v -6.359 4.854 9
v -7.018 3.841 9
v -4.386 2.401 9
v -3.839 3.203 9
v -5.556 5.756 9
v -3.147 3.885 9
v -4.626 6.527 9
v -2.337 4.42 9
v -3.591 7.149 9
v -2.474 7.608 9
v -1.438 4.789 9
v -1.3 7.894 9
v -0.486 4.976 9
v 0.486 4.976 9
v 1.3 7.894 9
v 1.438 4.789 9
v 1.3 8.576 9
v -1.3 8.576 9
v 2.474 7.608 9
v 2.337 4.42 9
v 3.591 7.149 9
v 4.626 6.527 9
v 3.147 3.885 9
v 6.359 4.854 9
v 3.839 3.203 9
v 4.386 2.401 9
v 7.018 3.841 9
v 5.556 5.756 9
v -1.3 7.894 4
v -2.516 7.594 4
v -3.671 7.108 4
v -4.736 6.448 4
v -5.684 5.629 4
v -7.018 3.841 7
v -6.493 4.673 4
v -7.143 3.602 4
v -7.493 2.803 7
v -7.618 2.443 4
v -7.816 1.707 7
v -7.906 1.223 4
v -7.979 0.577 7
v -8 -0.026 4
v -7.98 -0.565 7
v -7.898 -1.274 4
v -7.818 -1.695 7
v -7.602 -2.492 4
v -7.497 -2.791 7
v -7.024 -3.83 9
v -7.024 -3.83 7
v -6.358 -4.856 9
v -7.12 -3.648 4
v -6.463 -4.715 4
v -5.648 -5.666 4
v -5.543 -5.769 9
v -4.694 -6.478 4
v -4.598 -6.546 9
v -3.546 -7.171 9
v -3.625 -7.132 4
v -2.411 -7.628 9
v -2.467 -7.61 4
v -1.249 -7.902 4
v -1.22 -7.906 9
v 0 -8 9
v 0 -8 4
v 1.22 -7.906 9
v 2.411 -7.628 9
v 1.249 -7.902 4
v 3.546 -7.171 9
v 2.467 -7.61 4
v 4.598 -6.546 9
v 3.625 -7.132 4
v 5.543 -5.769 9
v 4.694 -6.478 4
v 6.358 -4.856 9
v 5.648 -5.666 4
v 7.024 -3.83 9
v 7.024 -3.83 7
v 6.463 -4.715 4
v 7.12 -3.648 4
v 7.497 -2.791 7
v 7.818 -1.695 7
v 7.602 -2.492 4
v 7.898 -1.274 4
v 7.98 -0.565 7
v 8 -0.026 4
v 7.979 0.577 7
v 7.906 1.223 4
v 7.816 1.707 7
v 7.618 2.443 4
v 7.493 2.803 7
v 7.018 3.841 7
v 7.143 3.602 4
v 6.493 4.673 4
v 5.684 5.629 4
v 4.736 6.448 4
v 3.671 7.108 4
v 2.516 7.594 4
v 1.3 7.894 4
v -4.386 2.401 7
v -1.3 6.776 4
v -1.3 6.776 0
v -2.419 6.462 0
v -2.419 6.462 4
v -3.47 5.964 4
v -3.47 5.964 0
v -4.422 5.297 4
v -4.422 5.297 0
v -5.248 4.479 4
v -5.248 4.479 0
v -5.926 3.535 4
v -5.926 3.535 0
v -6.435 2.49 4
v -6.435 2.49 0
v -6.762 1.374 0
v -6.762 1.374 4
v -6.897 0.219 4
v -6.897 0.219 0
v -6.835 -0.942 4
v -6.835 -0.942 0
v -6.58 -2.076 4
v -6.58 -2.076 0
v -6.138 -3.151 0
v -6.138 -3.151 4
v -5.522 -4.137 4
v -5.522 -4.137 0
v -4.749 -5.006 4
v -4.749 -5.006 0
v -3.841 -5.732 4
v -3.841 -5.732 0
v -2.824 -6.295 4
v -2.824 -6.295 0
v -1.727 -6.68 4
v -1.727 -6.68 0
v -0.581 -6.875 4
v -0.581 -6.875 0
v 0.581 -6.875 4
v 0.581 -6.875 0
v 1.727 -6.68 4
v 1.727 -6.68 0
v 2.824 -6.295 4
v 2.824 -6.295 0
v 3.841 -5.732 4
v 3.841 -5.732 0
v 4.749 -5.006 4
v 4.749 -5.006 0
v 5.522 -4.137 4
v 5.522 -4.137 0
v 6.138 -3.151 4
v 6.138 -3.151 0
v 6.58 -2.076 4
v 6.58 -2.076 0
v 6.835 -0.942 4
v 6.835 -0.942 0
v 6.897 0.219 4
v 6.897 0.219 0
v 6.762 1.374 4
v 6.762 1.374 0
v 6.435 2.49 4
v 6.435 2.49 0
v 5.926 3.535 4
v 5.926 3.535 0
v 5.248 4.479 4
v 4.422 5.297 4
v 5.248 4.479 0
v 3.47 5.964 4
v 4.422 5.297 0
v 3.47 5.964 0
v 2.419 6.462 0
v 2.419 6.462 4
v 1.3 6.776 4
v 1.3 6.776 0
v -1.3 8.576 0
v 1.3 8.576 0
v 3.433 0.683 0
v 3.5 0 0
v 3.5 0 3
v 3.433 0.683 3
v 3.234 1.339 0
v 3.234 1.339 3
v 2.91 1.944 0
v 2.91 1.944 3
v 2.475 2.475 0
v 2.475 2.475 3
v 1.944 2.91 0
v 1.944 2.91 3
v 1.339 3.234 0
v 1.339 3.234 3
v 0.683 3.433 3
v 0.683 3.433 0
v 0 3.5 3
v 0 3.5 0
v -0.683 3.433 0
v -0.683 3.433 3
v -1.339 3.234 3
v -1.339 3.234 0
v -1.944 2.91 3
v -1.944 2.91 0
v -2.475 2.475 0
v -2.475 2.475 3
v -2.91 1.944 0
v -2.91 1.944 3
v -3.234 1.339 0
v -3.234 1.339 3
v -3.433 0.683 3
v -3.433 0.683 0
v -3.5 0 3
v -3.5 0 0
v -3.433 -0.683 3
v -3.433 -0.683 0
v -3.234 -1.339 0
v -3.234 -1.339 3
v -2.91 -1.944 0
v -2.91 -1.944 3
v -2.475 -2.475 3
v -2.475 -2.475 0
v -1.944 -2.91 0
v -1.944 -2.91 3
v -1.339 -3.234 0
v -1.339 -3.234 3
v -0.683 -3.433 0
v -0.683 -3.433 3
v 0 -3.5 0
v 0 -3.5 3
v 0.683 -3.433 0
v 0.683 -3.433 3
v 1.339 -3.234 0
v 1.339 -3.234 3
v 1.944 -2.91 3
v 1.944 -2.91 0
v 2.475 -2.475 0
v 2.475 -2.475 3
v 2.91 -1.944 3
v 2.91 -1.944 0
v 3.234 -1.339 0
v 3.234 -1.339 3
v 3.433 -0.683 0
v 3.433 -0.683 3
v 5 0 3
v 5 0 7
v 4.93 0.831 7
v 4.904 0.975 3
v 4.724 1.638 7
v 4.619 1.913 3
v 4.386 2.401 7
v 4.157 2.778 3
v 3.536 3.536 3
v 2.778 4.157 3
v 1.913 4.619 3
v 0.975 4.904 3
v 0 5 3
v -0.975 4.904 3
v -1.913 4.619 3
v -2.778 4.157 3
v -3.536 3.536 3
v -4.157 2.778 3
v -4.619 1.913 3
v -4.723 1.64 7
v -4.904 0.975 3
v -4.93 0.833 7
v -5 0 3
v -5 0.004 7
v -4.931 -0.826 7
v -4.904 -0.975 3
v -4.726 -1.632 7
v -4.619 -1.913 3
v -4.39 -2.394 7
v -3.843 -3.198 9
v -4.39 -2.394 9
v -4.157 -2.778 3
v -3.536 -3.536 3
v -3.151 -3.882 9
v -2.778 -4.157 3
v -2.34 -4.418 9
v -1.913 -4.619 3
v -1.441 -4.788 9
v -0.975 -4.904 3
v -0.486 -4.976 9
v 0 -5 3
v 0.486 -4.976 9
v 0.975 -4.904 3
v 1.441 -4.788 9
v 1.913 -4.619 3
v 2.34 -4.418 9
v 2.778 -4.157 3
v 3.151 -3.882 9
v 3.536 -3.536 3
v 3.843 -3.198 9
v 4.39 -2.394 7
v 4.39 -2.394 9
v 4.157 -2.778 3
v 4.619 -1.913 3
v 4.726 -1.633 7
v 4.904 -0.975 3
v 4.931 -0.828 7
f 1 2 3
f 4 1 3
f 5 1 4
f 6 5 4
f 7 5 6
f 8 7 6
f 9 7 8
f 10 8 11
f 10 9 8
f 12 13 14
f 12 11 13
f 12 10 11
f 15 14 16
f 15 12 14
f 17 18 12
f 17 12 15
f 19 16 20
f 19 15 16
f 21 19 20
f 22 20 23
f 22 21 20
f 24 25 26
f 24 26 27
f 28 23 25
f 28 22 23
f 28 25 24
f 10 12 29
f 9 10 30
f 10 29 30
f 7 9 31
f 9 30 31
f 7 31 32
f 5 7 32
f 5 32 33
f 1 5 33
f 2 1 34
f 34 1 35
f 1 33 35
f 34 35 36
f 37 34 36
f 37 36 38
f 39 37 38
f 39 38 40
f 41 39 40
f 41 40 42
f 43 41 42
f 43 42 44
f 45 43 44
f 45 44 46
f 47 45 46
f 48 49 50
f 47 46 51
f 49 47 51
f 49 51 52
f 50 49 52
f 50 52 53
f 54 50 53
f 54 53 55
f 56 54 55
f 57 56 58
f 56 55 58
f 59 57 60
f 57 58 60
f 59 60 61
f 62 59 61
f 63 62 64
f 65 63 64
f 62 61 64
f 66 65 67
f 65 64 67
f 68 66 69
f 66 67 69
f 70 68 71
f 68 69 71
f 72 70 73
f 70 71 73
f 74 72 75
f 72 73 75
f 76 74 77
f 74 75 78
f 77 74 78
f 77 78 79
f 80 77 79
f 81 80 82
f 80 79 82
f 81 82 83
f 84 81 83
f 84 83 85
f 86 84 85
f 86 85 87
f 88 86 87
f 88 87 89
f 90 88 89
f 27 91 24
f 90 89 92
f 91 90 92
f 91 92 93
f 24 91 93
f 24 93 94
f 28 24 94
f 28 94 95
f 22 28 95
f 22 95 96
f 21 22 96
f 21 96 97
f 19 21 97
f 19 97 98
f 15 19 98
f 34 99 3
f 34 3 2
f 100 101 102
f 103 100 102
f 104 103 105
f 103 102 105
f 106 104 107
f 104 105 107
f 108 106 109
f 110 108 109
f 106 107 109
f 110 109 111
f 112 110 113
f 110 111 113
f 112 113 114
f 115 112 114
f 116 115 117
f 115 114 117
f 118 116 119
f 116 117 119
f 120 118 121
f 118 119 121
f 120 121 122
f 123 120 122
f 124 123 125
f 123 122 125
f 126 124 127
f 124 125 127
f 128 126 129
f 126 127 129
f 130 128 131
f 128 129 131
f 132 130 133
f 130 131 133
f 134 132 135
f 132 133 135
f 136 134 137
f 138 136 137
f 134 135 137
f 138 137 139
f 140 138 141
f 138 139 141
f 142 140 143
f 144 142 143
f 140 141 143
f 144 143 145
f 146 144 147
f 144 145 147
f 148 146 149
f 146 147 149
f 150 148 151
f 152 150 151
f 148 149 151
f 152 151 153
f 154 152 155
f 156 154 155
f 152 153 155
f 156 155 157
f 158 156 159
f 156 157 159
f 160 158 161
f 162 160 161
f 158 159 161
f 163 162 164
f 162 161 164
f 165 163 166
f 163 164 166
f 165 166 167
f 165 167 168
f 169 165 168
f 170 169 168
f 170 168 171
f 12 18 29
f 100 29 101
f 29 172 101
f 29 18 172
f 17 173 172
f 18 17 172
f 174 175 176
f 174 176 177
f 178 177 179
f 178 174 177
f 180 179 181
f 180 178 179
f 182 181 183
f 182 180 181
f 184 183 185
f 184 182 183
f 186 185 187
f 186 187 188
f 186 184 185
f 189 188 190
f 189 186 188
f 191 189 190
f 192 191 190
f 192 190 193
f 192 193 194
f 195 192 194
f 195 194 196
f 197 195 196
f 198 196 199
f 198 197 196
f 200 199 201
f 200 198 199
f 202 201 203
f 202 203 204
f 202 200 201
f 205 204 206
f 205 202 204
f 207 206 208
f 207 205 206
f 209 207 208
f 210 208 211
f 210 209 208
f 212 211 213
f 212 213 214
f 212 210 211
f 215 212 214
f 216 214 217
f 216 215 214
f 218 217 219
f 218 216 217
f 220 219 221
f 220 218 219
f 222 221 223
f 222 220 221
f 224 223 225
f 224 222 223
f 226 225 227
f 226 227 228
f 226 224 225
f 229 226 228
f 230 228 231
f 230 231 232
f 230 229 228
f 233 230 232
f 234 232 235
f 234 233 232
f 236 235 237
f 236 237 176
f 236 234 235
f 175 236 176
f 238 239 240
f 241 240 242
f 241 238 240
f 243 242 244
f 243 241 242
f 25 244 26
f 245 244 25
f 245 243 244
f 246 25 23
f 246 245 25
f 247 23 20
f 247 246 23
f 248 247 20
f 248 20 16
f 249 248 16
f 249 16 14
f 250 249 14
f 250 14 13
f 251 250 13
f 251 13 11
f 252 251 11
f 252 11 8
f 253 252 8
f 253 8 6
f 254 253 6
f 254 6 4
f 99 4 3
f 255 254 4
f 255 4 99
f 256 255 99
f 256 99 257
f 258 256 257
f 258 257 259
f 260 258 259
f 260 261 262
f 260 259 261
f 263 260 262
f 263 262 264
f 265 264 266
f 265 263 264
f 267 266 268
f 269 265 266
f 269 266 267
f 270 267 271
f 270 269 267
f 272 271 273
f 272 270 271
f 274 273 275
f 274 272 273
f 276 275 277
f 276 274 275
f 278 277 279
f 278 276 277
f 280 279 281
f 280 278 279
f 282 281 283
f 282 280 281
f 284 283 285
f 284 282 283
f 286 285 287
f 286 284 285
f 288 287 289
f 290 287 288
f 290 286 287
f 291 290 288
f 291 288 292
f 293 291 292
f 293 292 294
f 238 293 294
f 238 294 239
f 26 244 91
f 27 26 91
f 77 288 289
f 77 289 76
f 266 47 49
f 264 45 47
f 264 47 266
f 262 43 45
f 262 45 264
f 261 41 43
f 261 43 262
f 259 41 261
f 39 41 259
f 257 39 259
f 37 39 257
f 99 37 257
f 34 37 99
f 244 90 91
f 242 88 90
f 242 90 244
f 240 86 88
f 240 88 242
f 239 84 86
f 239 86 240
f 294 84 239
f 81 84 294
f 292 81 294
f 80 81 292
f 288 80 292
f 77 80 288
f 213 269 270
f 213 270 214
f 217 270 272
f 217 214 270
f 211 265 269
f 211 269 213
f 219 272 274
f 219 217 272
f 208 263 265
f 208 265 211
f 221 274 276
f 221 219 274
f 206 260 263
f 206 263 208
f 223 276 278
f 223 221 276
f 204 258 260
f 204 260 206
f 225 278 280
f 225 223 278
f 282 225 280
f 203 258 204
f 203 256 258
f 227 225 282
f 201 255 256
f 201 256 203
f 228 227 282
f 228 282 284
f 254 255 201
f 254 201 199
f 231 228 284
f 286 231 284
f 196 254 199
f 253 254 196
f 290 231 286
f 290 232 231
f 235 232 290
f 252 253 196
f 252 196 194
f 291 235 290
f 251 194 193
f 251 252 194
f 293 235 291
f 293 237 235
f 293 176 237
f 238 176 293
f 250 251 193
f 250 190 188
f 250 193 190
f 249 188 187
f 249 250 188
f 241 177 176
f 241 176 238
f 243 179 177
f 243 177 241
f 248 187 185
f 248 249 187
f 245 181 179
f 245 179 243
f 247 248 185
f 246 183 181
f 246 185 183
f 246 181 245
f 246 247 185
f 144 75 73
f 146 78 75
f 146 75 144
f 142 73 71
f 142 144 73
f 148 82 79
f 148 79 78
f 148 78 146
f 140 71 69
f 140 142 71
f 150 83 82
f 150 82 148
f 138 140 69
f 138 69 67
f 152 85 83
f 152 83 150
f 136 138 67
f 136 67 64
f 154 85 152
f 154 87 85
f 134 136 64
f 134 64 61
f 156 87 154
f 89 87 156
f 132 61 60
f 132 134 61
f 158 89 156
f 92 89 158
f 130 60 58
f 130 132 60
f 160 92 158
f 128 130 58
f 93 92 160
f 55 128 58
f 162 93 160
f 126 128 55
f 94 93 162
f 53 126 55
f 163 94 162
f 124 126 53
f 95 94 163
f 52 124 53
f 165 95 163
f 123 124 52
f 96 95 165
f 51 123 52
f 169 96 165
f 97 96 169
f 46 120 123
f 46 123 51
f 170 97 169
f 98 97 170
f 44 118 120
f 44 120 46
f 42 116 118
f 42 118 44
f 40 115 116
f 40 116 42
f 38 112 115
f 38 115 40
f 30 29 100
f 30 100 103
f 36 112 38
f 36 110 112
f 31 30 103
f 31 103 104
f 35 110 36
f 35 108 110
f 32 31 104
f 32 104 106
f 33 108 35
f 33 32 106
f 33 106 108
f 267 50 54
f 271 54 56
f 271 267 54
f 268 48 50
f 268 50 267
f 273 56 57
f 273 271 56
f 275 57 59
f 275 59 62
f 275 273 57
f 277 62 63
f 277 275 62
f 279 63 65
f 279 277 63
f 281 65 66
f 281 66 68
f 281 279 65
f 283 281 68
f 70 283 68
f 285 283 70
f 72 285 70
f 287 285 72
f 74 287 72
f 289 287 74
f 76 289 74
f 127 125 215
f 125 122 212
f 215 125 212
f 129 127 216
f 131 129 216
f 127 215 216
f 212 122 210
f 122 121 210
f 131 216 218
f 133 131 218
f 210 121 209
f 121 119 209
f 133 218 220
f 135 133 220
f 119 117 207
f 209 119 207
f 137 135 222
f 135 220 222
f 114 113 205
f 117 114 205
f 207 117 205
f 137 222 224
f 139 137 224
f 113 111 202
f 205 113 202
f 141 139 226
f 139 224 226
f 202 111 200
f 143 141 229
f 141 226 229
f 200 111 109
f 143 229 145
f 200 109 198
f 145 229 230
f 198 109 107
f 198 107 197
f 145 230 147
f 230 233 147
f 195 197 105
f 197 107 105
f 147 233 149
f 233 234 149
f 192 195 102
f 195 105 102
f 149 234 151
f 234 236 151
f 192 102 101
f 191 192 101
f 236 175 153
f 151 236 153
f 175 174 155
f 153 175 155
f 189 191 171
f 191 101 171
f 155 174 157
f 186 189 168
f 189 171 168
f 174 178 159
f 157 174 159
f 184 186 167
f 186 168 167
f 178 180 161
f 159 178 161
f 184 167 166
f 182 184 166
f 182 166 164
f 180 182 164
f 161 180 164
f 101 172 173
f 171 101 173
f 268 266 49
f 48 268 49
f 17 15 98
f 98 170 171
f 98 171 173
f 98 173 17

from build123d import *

# Parameters (mm, degrees)
SKETCH1_R                = 8
SKETCH1_R_2              = 3.5
BOSS_EXTRUDE1_DEPTH      = 3
SKETCH2_R                = 8
SKETCH2_R_2              = 5
BOSS_EXTRUDE2_DEPTH      = 6
WRAP3_SECTION_W          = 4
WRAP3_SECTION_H          = 2
WRAP3_ANGLE              = 57.295779513
WRAP3_SECTOR_2_SECTION_W = 4
WRAP3_SECTOR_2_SECTION_H = 2
WRAP3_SECTOR_2_ANGLE     = 57.295779513
CUT_EXTRUDE1_DEPTH       = 4
BOSS_EXTRUDE3_DEPTH      = 9


with BuildPart() as part:
    # Sketch1 → Boss-Extrude1 (new body)
    with BuildSketch(Plane.XY):
        Circle(SKETCH1_R)
        Circle(SKETCH1_R_2, mode=Mode.SUBTRACT)
    extrude(amount=BOSS_EXTRUDE1_DEPTH)

    # Sketch2 → Boss-Extrude2 (add)
    with BuildSketch(Plane.XY.offset(3)):
        Circle(SKETCH2_R)
        Circle(SKETCH2_R_2, mode=Mode.SUBTRACT)
    extrude(amount=BOSS_EXTRUDE2_DEPTH)

    # Wrap3 section (on wrap section) → Wrap3 (revolve, cut)
    with BuildSketch(Plane(origin=(0, 0, 0), x_dir=(-0.8779640629990781, -0.4787265441587198, 0), z_dir=(0.4787265441587198, -0.8779640629990781, 0))):
        with Locations((6, -8)):
            Rectangle(WRAP3_SECTION_W, WRAP3_SECTION_H)
    revolve(axis=Axis((0, 0, 0), (0, 0, -1)), revolution_arc=WRAP3_ANGLE, mode=Mode.SUBTRACT)

    # Wrap3 sector 2 section (on wrap section) → Wrap3 sector 2 (revolve, cut)
    with BuildSketch(Plane(origin=(0, 0, 0), x_dir=(0.8772005042746819, 0.4801242290285337, 0), z_dir=(-0.4801242290285337, 0.8772005042746819, 0))):
        with Locations((6, -8)):
            Rectangle(WRAP3_SECTOR_2_SECTION_W, WRAP3_SECTOR_2_SECTION_H)
    revolve(axis=Axis((0, 0, 0), (0, 0, -1)), revolution_arc=WRAP3_SECTOR_2_ANGLE, mode=Mode.SUBTRACT)

    # Sketch5 → Cut-Extrude1 (cut)
    with BuildSketch(Plane(origin=(0, 0, 0), x_dir=(-1, 0, 0), z_dir=(0, 0, -1))):
        with BuildLine():
            Line((-1.3, 6.776429738), (-1.3, 7.893668349))
            ThreePointArc((-1.3, 7.893668349), (0, -8), (1.3, 7.893668349))
            Line((1.3, 7.893668349), (1.3, 6.776429738))
            ThreePointArc((1.3, 6.776429738), (0, -6.9), (-1.3, 6.776429738))
        make_face()
    extrude(amount=-CUT_EXTRUDE1_DEPTH, mode=Mode.SUBTRACT)

    # Sketch6 → Boss-Extrude3 (add)
    with BuildSketch(Plane(origin=(0, 0, 0), x_dir=(-1, 0, 0), z_dir=(0, 0, -1))):
        with BuildLine():
            Line((-1.3, 7.797149396), (-1.3, 8.576429738))
            Line((-1.3, 8.576429738), (1.3, 8.576429738))
            Line((1.3, 8.576429738), (1.3, 7.797149396))
            ThreePointArc((1.3, 7.797149396), (0, 7.903481047), (-1.3, 7.797149396))
        make_face()
    extrude(amount=-BOSS_EXTRUDE3_DEPTH)


solid = part.part
